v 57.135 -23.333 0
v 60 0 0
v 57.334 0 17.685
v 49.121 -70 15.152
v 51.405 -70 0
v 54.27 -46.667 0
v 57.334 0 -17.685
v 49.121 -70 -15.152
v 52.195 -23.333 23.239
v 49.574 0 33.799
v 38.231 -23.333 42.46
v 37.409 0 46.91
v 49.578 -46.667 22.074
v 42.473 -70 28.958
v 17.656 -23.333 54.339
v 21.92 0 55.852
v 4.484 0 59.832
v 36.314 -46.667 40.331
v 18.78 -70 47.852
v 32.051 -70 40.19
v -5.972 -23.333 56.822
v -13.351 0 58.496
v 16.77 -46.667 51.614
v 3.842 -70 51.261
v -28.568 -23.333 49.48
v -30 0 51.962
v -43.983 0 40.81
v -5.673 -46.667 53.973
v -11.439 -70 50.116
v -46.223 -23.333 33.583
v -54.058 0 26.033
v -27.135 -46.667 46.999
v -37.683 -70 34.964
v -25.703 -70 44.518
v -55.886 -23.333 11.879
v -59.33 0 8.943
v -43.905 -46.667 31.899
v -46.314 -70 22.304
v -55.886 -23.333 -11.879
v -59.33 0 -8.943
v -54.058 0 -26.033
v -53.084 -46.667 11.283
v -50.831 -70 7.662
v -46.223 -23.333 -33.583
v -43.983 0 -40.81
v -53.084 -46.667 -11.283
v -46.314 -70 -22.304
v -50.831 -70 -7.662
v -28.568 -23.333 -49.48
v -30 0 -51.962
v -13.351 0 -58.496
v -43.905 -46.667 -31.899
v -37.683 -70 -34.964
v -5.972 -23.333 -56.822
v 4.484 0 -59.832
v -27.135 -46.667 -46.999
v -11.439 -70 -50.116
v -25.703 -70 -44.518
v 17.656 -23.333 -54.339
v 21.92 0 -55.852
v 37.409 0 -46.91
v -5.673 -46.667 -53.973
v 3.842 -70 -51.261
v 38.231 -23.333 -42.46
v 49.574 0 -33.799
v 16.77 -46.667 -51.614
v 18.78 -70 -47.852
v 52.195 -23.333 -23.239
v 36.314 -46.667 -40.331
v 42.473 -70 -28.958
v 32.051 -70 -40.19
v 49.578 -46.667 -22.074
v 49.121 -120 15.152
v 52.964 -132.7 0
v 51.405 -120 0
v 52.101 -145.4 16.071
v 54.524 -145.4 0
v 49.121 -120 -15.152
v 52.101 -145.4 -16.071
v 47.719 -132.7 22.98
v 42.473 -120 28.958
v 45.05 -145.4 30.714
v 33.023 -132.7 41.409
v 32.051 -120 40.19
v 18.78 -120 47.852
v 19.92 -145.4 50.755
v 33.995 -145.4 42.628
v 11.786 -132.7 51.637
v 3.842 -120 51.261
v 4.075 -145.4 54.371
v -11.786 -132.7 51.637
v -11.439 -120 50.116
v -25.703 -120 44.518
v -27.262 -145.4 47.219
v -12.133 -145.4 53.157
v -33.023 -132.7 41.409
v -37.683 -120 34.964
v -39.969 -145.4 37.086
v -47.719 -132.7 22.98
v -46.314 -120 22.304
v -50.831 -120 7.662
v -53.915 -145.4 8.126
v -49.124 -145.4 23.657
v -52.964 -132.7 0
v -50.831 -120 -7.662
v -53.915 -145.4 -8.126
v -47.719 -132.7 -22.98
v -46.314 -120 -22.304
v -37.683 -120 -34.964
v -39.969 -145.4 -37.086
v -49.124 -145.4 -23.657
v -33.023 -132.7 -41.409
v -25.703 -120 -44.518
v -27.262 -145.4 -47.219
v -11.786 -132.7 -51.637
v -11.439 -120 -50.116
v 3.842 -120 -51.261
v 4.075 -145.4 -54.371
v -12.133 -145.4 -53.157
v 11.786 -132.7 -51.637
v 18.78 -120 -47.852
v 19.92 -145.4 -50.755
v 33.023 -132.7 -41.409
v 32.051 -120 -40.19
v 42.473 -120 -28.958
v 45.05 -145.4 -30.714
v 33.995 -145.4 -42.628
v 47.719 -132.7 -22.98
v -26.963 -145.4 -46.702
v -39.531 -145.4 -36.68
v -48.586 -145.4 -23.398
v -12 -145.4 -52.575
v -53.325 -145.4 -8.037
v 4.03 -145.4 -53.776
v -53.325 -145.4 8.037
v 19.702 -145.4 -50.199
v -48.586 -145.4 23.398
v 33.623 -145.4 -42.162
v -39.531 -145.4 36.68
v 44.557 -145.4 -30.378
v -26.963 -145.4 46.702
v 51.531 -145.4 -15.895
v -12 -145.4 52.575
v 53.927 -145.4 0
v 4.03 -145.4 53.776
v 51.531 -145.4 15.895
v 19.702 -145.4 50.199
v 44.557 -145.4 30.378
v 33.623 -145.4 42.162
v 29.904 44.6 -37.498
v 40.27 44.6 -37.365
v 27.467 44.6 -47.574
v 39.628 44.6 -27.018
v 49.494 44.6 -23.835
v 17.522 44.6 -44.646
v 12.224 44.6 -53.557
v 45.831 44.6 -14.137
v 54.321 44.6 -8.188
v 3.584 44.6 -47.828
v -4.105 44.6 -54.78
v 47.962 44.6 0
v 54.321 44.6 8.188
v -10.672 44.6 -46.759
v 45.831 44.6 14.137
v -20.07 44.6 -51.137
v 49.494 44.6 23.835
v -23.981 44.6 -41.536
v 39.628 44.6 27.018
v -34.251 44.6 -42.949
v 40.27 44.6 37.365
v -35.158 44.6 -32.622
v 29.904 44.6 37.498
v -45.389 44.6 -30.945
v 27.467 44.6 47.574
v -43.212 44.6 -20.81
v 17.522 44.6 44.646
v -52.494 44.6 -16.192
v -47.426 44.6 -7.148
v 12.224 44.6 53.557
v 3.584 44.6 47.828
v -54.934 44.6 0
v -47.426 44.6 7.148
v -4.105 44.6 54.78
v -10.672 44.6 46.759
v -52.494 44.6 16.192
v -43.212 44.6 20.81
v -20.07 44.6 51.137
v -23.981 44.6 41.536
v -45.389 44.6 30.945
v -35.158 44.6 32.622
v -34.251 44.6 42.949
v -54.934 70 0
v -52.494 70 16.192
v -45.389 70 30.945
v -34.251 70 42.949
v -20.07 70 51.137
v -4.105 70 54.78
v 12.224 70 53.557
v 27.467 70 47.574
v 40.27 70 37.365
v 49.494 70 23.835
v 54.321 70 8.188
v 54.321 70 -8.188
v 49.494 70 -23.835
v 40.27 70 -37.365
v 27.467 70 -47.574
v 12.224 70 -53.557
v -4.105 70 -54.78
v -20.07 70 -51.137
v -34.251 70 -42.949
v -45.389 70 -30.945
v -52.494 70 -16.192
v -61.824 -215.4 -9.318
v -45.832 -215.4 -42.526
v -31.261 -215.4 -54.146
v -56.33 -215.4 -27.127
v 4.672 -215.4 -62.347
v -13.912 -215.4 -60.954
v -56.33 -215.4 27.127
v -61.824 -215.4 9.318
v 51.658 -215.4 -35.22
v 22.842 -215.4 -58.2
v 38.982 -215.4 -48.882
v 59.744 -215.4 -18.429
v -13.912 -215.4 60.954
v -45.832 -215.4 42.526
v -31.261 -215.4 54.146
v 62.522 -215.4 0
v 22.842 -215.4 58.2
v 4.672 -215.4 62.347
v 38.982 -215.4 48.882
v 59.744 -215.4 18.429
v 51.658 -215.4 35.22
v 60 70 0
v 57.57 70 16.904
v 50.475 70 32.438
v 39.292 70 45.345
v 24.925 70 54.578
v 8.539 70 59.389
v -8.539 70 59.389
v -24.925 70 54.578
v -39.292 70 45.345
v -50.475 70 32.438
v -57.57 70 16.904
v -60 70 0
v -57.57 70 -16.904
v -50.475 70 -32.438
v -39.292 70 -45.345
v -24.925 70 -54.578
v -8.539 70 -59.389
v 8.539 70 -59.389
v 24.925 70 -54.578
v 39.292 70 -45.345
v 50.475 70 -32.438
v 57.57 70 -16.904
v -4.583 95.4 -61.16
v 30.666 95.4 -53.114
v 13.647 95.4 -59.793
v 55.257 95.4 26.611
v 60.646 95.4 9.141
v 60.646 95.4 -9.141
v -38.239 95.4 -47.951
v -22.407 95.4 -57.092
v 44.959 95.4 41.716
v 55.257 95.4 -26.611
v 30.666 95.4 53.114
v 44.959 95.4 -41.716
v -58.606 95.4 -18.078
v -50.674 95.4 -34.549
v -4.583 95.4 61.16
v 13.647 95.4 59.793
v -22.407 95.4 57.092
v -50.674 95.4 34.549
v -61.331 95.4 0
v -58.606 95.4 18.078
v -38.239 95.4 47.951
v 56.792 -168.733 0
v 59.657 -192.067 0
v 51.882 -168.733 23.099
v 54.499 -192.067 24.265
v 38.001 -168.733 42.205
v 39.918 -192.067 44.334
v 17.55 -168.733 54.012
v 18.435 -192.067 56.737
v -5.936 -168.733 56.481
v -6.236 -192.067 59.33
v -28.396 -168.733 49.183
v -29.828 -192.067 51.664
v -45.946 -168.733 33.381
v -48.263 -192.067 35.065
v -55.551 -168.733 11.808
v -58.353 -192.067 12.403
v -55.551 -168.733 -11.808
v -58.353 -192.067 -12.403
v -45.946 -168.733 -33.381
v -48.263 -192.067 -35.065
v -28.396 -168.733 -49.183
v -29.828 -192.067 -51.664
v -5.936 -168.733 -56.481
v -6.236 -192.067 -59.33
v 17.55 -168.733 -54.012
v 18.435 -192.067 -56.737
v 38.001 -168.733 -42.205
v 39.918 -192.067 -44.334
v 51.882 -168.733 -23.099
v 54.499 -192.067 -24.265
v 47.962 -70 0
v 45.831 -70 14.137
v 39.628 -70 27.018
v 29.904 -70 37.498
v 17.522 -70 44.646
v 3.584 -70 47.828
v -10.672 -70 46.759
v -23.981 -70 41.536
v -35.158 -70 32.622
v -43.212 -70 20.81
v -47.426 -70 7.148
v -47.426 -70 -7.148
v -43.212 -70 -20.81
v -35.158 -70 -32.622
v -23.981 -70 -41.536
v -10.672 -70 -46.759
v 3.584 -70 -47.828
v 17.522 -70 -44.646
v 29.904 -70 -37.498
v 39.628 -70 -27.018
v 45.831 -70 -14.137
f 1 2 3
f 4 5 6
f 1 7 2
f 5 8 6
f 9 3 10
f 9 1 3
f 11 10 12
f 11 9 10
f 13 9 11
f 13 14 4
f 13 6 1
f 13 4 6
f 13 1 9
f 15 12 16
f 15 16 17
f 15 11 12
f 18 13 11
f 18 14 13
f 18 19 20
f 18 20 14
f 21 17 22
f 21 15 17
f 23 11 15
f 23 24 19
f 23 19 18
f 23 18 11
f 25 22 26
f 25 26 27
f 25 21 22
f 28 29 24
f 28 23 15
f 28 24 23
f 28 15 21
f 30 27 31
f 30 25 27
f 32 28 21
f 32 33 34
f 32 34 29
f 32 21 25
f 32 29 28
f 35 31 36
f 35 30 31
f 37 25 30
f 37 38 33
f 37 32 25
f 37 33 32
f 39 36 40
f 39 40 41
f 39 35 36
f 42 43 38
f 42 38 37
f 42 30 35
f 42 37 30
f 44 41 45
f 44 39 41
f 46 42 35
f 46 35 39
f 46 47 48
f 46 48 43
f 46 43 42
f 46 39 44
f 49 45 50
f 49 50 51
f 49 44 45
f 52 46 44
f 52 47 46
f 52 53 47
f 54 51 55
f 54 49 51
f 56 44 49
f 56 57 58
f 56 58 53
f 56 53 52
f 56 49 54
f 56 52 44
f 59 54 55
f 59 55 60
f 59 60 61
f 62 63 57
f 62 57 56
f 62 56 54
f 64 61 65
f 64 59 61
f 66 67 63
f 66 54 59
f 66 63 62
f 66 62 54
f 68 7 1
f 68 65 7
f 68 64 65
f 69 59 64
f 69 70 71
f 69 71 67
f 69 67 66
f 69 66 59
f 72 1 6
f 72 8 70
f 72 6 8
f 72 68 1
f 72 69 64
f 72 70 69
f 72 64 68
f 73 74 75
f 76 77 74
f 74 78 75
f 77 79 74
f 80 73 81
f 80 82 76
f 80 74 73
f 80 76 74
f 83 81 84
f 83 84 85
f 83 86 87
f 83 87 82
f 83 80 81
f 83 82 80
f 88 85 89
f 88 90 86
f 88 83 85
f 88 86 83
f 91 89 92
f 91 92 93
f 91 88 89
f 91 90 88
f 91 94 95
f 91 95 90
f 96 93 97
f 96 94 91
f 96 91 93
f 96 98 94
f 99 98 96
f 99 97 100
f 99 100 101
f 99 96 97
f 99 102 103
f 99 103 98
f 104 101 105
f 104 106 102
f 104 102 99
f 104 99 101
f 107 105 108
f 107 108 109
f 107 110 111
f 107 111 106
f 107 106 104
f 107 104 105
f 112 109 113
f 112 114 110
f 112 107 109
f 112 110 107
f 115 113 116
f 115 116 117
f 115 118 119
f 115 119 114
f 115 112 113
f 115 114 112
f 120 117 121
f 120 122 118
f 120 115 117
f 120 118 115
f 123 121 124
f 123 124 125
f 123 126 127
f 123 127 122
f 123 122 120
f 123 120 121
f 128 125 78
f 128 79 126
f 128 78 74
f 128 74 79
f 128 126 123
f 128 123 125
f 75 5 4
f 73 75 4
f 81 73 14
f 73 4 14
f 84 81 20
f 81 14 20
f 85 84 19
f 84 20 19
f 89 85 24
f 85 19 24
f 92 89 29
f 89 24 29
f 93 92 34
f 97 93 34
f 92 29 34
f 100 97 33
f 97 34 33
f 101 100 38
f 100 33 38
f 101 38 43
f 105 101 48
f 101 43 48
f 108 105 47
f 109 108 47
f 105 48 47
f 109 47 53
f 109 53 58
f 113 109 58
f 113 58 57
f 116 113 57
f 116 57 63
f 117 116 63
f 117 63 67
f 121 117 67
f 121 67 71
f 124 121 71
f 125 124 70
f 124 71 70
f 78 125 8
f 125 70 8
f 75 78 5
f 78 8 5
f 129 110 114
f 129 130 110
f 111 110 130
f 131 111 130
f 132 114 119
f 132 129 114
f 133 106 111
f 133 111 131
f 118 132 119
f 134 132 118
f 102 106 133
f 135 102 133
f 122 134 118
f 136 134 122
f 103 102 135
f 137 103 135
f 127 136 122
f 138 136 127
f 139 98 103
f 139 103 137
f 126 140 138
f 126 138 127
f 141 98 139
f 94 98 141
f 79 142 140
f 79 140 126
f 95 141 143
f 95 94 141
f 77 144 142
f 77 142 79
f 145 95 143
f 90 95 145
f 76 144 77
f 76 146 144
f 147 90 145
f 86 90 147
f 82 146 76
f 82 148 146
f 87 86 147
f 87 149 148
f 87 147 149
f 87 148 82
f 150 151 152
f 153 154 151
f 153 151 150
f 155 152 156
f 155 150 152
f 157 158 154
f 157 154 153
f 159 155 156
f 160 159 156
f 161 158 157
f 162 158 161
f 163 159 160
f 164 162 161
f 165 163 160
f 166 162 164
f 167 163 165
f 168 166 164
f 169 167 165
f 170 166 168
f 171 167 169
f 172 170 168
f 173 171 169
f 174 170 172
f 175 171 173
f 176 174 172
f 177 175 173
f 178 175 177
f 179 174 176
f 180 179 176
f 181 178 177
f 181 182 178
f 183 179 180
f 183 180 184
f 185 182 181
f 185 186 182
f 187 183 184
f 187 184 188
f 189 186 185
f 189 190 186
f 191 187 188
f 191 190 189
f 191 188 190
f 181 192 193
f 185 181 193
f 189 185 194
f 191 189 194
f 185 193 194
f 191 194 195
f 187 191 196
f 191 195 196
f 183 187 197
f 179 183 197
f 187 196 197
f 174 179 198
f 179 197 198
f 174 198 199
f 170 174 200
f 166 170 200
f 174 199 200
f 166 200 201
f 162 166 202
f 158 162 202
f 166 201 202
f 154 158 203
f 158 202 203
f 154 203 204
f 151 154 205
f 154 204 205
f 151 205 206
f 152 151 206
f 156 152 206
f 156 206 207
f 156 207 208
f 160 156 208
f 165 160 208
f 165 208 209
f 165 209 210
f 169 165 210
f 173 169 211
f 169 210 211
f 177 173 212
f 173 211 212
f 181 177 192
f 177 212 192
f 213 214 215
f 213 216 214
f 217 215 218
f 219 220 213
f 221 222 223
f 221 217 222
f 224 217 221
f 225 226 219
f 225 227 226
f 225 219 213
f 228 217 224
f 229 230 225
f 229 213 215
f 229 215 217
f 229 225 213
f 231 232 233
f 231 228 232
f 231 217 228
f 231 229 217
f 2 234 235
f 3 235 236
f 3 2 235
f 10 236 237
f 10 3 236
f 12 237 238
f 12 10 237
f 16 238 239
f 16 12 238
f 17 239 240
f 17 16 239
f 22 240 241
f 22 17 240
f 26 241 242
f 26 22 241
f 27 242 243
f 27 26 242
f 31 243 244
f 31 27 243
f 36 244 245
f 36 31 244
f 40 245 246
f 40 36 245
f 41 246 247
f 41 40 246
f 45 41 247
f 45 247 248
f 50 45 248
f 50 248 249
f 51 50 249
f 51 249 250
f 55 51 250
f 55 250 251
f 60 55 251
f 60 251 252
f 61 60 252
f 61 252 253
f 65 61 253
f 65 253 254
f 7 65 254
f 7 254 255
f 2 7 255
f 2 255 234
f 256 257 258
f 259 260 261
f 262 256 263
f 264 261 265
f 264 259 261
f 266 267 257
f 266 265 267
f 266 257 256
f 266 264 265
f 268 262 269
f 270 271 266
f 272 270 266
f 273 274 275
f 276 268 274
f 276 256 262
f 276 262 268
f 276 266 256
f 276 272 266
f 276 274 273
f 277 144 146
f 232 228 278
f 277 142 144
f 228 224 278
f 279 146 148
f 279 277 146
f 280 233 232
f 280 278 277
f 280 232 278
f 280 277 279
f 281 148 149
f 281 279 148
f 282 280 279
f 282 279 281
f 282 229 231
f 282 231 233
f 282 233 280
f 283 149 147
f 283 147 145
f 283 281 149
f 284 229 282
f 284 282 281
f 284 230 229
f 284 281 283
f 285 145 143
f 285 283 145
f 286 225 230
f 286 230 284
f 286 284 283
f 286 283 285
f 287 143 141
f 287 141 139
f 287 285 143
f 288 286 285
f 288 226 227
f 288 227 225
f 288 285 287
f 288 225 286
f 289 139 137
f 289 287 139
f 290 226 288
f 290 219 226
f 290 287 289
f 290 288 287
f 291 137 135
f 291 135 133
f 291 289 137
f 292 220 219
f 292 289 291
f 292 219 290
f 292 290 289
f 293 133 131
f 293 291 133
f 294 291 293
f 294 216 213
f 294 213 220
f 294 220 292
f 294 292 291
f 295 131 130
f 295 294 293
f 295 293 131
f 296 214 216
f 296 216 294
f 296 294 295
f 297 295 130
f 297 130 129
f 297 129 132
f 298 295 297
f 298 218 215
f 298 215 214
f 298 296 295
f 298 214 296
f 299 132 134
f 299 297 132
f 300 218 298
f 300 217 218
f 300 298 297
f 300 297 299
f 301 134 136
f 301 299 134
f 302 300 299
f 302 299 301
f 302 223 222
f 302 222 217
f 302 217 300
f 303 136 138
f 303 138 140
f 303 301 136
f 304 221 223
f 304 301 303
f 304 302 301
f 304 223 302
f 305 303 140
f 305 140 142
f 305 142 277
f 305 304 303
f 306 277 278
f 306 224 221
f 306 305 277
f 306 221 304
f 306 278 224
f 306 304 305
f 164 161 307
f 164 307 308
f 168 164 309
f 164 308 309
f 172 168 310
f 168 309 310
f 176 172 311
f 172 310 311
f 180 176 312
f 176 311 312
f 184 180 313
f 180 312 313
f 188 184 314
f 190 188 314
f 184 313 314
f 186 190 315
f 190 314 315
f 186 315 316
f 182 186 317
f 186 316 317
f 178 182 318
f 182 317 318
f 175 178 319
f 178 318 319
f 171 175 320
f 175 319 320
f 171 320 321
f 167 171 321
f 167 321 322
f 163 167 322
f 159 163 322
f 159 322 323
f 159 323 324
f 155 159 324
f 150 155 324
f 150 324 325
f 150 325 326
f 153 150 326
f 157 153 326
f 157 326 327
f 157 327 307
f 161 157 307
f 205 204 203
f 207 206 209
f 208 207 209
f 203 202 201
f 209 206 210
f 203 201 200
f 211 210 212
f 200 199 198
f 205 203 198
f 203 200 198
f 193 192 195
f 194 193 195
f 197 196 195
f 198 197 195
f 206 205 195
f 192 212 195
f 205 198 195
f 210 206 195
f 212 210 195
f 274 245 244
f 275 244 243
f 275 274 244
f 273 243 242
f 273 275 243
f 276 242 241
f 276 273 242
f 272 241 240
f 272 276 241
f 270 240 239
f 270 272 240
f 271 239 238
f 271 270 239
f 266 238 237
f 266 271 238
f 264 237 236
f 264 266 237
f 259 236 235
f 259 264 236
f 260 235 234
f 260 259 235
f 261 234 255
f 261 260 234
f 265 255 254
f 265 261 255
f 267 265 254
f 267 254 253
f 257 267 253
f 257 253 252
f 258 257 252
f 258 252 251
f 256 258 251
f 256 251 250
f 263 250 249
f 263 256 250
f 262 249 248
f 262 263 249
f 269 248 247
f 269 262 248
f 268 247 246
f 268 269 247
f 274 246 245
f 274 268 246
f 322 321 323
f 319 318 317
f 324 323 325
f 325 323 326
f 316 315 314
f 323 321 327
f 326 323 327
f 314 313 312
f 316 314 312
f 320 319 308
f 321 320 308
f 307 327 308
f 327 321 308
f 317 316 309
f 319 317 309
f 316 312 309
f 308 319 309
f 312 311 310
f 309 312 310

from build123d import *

# Parameters (mm, degrees)
F0_R      = 60
F1_DEPTH  = 70
F2_R      = 60
F3_DEPTH  = 70
F3_TAPER  = 7
F5_R      = 54.9341030365
F6_DEPTH  = 25.4
F7_R      = 47.9617586767
F8_DEPTH  = 205.994
F4_R      = 51.4050807368
F12_DEPTH = 50
F13_R     = 51.4050807368
F14_DEPTH = 25.4
F14_TAPER = -7
F15_R     = 53.9269190887
F16_DEPTH = 70
F16_TAPER = -7
F11_R     = 60
F17_DEPTH = 25.4
F17_TAPER = -3


with BuildPart() as f1:
    # F0 (on Front) → F1 (new body)
    with BuildSketch(Plane.XZ):
        Circle(F0_R)
    extrude(amount=-F1_DEPTH)

    # F2 (on face) → F3 (join)
    with BuildSketch(Plane.XZ):
        Circle(F2_R)
    extrude(amount=F3_DEPTH, taper=F3_TAPER)

    # F5 (on face) → F6 (cut)
    with BuildSketch(Plane(origin=(0, 70, 0), x_dir=(-1, 0, 0), z_dir=(0, 1, 0))):
        Circle(F5_R)
    extrude(amount=-F6_DEPTH, mode=Mode.SUBTRACT)

    # F7 (on face) → F8 (cut)
    with BuildSketch(Plane.XZ.offset(70)):
        Circle(F7_R)
    extrude(amount=-F8_DEPTH, mode=Mode.SUBTRACT)

    # F4 (on face) → F12 (join)
    with BuildSketch(Plane.XZ.offset(70)):
        Circle(F4_R)
    extrude(amount=F12_DEPTH)

    # F13 (on face) → F14 (join)
    with BuildSketch(Plane.XZ.offset(120)):
        Circle(F13_R)
    extrude(amount=F14_DEPTH, taper=F14_TAPER)

    # F15 (on face) → F16 (join)
    with BuildSketch(Plane.XZ.offset(145.4)):
        Circle(F15_R)
    extrude(amount=F16_DEPTH, taper=F16_TAPER)

    # F11 (on face) → F17 (join)
    with BuildSketch(Plane(origin=(0, 70, 0), x_dir=(-1, 0, 0), z_dir=(0, 1, 0))):
        Circle(F11_R)
    extrude(amount=F17_DEPTH, taper=F17_TAPER)


solid = f1.part
